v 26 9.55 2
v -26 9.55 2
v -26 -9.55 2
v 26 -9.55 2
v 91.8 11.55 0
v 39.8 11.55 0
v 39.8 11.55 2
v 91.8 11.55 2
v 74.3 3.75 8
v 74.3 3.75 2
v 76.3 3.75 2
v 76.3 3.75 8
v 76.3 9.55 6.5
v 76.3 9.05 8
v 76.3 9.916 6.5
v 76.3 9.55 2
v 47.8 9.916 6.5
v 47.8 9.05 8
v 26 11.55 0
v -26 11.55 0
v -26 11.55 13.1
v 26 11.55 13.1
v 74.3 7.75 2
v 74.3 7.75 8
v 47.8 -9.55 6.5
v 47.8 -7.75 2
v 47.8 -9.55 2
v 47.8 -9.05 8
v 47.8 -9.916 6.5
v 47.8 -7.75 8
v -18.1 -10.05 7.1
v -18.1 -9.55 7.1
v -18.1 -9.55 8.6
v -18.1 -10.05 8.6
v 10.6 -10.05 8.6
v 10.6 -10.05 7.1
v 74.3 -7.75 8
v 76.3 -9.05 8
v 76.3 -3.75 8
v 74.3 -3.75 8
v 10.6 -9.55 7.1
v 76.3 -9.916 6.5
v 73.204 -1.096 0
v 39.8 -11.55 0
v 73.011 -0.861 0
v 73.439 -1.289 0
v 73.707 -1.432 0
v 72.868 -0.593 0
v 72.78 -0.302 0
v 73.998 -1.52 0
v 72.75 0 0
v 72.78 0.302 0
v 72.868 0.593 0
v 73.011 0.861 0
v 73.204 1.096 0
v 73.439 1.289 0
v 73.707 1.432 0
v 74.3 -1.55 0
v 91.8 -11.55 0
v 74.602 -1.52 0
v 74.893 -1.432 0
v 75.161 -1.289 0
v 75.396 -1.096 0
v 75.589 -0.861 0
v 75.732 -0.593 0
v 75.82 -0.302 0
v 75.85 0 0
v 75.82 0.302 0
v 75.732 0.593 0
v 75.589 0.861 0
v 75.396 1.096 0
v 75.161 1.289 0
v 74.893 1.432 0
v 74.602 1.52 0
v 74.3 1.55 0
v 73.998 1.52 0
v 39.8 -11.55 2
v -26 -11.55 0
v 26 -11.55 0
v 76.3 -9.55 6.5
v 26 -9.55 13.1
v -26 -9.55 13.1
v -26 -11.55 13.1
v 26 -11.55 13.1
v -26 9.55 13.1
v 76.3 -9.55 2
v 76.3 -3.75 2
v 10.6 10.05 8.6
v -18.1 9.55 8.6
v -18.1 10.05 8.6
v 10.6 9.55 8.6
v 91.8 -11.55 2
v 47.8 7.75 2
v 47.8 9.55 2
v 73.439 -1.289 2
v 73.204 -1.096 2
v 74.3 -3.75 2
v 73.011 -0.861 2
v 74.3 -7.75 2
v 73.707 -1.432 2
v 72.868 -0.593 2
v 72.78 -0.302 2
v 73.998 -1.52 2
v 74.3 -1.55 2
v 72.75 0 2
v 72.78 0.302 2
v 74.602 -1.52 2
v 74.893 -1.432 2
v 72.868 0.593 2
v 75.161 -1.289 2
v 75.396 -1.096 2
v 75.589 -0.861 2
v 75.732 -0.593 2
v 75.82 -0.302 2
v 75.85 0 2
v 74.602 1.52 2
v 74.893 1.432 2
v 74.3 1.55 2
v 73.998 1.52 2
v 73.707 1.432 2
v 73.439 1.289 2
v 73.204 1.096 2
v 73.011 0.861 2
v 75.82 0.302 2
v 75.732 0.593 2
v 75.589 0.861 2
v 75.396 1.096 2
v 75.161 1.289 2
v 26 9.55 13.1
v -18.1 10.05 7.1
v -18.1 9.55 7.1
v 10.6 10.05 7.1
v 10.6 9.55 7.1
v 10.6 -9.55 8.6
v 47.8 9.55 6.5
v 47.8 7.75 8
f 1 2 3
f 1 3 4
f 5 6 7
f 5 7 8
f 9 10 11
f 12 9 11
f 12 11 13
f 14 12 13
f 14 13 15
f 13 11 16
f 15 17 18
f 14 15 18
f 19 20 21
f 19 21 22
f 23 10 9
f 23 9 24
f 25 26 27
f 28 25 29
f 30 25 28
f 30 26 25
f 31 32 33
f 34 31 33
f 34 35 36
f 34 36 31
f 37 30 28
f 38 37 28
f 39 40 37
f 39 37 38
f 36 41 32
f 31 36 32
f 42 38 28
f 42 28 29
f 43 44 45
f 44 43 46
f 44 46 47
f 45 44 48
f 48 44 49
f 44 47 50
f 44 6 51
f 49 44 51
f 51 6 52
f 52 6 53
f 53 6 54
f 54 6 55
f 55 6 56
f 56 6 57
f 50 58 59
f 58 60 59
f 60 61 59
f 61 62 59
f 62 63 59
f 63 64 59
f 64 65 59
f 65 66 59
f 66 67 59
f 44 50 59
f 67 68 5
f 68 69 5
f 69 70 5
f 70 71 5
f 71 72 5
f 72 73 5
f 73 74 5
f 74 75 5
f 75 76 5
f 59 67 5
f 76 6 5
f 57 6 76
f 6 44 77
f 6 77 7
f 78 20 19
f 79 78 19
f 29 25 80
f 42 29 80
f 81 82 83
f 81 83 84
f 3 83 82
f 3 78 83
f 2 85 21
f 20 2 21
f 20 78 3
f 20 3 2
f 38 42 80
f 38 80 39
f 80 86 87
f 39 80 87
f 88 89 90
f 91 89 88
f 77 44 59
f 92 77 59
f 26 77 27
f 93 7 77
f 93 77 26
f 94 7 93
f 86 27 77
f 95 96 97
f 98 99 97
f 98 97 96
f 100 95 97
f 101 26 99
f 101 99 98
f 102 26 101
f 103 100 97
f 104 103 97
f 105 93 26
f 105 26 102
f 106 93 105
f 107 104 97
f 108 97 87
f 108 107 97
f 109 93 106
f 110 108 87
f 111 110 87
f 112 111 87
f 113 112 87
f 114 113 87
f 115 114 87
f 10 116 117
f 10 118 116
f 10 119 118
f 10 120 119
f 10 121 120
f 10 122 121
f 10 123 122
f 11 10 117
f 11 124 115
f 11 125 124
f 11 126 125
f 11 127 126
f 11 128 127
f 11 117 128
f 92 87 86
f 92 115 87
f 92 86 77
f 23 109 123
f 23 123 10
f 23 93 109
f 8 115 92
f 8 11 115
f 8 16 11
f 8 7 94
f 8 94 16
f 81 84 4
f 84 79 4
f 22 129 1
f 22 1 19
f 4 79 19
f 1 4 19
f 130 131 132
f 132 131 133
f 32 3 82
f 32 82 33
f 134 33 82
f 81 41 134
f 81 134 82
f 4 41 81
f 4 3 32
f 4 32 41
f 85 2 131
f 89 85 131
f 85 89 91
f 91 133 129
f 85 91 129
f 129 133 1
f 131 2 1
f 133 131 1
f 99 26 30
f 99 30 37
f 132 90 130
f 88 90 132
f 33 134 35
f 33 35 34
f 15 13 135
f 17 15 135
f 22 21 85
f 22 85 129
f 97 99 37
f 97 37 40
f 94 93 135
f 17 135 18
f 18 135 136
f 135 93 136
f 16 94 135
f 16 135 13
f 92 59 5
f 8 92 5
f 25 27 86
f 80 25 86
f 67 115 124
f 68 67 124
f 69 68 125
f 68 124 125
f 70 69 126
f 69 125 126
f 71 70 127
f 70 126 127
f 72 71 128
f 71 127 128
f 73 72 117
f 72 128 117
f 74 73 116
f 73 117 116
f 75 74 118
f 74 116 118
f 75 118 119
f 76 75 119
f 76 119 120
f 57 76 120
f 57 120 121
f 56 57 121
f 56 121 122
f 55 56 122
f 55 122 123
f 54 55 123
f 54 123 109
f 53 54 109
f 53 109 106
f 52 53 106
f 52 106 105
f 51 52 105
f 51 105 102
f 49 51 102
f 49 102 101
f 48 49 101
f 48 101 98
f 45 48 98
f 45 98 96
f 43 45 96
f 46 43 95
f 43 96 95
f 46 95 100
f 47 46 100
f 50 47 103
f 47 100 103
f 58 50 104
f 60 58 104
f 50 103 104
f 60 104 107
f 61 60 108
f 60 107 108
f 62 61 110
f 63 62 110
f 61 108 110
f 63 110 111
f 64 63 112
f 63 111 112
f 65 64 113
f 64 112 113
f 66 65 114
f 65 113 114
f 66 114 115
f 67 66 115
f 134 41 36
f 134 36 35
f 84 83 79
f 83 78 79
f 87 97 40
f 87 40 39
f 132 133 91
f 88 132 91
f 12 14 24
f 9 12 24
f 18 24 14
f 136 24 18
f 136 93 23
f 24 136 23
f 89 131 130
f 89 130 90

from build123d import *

# Parameters (mm, degrees)
F0_W         = 52
F0_H         = 23.1
F1_DEPTH     = 2
F3_W         = 52
F3_H         = 2
F4_DEPTH     = 11.1
F5_W         = 28.5
F5_H         = 1.8
F6_DEPTH     = 6
F7_W         = 28.5
F7_H         = 1.5
F8_DEPTH     = 0.5
F9_T1_DEPTH  = 37.4619279412
F10_W        = 28.5
F10_H        = 1.5
F11_DEPTH    = 0.5
F12_T1_DEPTH = 37.4619279412
F13_W        = 28.7
F13_H        = 1.5
F14_DEPTH    = 0.5
F15_W        = 28.7
F15_H        = 1.5
F16_DEPTH    = 0.5
F17_R        = 1.55
F18_DEPTH    = 2.001
F19_W        = 2
F19_H        = 4
F20_DEPTH    = 6


# Not quite as in the source:
# - a fillet or chamfer that OpenCascade refuses, or shapes differently, is made with other operations: its cross-section is extruded or revolved along the edge and cut away or added


with BuildPart() as f1:
    # F0 (on Top) → F1 (new body)
    with BuildSketch(Plane.XY):
        Rectangle(F0_W, F0_H)
    extrude(amount=F1_DEPTH)


with BuildPart() as f2_1:
    # F2: copy of F1
    add(f1.part.moved(Location((65.8, 0, 0))))

    # F5 (on face) → F6 (join)
    with BuildSketch(Plane.XY.offset(2)):
        with Locations((62.05, -8.65)):
            Rectangle(F5_W, F5_H)
        with Locations((62.05, 8.65)):
            Rectangle(F5_W, F5_H)
    extrude(amount=F6_DEPTH)

    # F7 (on face) → F8 (join)
    with BuildSketch(Plane.XZ.offset(9.55)):
        with Locations((62.05, 7.25)):
            Rectangle(F7_W, F7_H)
    extrude(amount=F8_DEPTH)

    # F9: chamfer of 1 x 1.7320508076 on 1 edges, made by hand

    # F9_s2 → F9_t1 (cut)
    with BuildSketch(Plane.YZ.offset(43.3190360294)):
        Polygon((-9.05, 8), (-10.05, 6.2679491924), (-10.05, 8), align=None)
    extrude(amount=F9_T1_DEPTH, mode=Mode.SUBTRACT)

    # F10 (on face) → F11 (join)
    with BuildSketch(Plane(origin=(0, 9.55, 0), x_dir=(-1, 0, 0), z_dir=(0, 1, 0))):
        with Locations((-62.05, 7.25)):
            Rectangle(F10_W, F10_H)
    extrude(amount=F11_DEPTH)

    # F12: chamfer of 1 x 1.7320508076 on 1 edges, made by hand

    # F12_s2 → F12_t1 (cut)
    with BuildSketch(Plane.YZ.offset(43.3190360294)):
        Polygon((10.05, 6.2679491924), (9.05, 8), (10.05, 8), align=None)
    extrude(amount=F12_T1_DEPTH, mode=Mode.SUBTRACT)

    # F17 (on face) → F18 (cut, through all)
    with BuildSketch(Plane.XY.offset(2)):
        with Locations((74.3, 0)):
            Circle(F17_R)
    extrude(amount=-F18_DEPTH, mode=Mode.SUBTRACT)

    # F19 (on face) → F20 (join)
    with BuildSketch(Plane.XY.offset(2)):
        with Locations((75.3, -5.75)):
            Rectangle(F19_W, F19_H)
        with Locations((75.3, 5.75)):
            Rectangle(F19_W, F19_H)
    extrude(amount=F20_DEPTH)


with BuildPart() as f1_1:
    add(f1.part)

    # F3 (on face) → F4 (join)
    with BuildSketch(Plane.XY.offset(2)):
        with Locations((0, -10.55)):
            Rectangle(F3_W, F3_H)
        with Locations((0, 10.55)):
            Rectangle(F3_W, F3_H)
    extrude(amount=F4_DEPTH)

    # F13 (on face) → F14 (cut)
    with BuildSketch(Plane(origin=(0, -9.55, 0), x_dir=(-1, 0, 0), z_dir=(0, 1, 0))):
        with Locations((3.75, 7.85)):
            Rectangle(F13_W, F13_H)
    extrude(amount=-F14_DEPTH, mode=Mode.SUBTRACT)

    # F15 (on face) → F16 (cut)
    with BuildSketch(Plane.XZ.offset(-9.55)):
        with Locations((-3.75, 7.85)):
            Rectangle(F15_W, F15_H)
    extrude(amount=-F16_DEPTH, mode=Mode.SUBTRACT)


solid = Compound([f2_1.part, f1_1.part])
